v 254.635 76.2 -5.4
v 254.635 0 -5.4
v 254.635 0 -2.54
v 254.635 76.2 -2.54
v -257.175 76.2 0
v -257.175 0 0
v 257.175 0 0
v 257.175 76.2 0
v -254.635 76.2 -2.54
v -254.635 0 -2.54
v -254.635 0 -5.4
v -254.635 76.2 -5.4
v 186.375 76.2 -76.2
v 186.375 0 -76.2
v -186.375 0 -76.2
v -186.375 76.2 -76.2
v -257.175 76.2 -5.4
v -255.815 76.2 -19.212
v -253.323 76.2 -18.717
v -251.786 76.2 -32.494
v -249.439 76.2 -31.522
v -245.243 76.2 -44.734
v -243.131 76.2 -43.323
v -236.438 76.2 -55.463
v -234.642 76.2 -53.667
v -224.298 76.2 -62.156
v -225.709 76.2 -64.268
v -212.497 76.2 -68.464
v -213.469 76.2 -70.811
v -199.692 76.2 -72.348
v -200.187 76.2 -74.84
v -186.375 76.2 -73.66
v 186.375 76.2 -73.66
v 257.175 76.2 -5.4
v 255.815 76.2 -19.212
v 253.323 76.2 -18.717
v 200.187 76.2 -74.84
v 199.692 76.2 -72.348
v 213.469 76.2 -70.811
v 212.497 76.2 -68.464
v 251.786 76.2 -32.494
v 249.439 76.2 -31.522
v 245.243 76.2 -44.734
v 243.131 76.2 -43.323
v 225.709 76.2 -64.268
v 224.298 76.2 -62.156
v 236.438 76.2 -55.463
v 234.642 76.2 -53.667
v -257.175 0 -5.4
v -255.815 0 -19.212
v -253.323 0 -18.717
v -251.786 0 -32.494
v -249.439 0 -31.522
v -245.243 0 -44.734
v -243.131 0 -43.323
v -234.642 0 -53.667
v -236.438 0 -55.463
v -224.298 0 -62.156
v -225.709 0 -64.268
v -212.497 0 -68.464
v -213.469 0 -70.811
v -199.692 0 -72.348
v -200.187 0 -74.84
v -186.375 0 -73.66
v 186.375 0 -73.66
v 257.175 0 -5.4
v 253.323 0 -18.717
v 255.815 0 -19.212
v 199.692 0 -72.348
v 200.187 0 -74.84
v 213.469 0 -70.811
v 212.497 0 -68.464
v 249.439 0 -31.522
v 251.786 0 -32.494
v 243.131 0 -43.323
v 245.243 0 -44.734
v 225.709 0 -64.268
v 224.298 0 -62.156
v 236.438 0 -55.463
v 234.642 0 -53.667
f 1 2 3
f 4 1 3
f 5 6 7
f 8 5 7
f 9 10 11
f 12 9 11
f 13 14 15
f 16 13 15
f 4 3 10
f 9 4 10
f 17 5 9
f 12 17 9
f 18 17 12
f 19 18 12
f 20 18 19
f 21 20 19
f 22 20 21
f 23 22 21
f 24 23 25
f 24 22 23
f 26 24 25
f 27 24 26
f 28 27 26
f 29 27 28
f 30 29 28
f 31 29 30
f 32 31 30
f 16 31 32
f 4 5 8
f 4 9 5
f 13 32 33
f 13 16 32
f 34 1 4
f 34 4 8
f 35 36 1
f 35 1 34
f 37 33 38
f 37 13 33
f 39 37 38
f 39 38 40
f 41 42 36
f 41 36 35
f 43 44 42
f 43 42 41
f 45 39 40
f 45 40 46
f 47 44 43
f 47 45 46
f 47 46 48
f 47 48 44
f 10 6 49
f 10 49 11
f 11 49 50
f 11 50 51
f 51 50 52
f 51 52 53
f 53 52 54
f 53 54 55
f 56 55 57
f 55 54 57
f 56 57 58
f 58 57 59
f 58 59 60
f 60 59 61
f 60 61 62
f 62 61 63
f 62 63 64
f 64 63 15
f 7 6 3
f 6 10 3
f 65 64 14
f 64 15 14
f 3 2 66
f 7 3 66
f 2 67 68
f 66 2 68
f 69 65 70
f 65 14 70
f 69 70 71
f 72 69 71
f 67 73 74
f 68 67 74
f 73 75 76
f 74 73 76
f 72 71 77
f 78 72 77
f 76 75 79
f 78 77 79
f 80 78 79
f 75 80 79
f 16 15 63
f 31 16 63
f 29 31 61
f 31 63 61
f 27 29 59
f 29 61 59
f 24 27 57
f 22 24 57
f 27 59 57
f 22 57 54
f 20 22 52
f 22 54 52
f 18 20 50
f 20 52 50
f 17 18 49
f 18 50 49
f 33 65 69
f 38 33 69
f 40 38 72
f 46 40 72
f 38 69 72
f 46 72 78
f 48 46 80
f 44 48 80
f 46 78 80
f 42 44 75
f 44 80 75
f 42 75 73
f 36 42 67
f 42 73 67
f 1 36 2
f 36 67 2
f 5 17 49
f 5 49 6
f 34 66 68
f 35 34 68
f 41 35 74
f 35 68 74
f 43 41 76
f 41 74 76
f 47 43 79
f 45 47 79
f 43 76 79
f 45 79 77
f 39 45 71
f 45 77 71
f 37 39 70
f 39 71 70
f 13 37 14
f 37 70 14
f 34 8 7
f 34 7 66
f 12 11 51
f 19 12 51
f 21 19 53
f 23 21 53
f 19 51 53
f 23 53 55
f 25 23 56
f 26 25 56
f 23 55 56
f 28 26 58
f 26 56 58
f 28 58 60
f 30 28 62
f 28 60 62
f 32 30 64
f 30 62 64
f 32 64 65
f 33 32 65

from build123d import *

# Parameters (mm, degrees)
BOSS_EXTRUDE1_DEPTH = 76.2


with BuildPart() as part:
    # Sketch1 → Boss-Extrude1 (new body)
    with BuildSketch(Plane(origin=(0, 0, 0), x_dir=(1, 0, 0), z_dir=(0, 1, 0))):
        with BuildLine():
            Line((-257.175, 0), (257.175, 0))
            Line((257.175, 0), (257.175, 5.4))
            ThreePointArc((257.175, 5.4), (236.438160108, 55.463160108), (186.375, 76.2))
            Line((186.375, 76.2), (-186.375, 76.2))
            ThreePointArc((-186.375, 76.2), (-236.438160108, 55.463160108), (-257.175, 5.4))
            Line((-257.175, 5.4), (-257.175, 0))
        make_face()
        with BuildLine():
            Line((254.635, 5.4), (254.635, 2.54))
            Line((254.635, 2.54), (-254.635, 2.54))
            Line((-254.635, 2.54), (-254.635, 5.4))
            ThreePointArc((-254.635, 5.4), (-234.642108884, 53.667108884), (-186.375, 73.66))
            Line((-186.375, 73.66), (186.375, 73.66))
            ThreePointArc((186.375, 73.66), (234.642108884, 53.667108884), (254.635, 5.4))
        make_face(mode=Mode.SUBTRACT)
    extrude(amount=BOSS_EXTRUDE1_DEPTH)


solid = part.part
